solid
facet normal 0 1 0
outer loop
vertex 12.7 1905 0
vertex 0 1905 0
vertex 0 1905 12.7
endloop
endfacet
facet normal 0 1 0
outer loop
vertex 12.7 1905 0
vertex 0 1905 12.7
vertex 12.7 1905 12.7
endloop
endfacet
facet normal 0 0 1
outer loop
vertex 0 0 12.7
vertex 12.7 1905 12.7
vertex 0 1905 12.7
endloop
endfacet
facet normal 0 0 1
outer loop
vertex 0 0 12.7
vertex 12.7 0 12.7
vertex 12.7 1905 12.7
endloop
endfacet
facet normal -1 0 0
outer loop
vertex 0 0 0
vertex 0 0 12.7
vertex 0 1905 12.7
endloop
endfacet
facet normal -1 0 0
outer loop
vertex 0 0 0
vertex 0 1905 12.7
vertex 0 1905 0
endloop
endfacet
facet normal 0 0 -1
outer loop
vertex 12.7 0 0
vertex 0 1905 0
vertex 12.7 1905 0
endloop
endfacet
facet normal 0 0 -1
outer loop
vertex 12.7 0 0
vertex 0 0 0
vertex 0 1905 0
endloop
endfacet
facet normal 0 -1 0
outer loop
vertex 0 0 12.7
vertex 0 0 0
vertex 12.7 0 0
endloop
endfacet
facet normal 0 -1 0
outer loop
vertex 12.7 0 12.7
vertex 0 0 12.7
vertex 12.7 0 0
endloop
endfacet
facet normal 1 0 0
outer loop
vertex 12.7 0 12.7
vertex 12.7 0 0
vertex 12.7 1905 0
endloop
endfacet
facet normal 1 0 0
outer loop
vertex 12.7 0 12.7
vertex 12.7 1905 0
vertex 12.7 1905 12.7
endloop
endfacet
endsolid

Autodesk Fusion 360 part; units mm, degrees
sketch "Sketch4" plane through (0, 0, 0) normal (0, 1, 0) x (1, 0, 0)
  line L0 (0, 0) -> (12.7, 0)
  line L1 (12.7, 0) -> (12.7, -12.7)
  line L2 (12.7, -12.7) -> (0, -12.7)
  line L3 (0, -12.7) -> (0, 0)
  dimension "d19" = 12.7
extrude "Extrude4" add sketch "Sketch4" along normal blind 33.02 makes body 1
delete_body "RemoveBody1" bodies 1
extrude "Extrude5" add sketch "Sketch4" along normal blind 1905 separate body makes body 2
equation "Force = 300 lbforce"
equation "Elastic_modulus = 10000000 psi"
equation "Deflection = 0.009 in"
equation "Side = 0.5 in"
equation "Length = Deflection * Side ^ 2 * Elastic_modulus / Force"
equation "d19 = Side"
equation "d22 = Length"
